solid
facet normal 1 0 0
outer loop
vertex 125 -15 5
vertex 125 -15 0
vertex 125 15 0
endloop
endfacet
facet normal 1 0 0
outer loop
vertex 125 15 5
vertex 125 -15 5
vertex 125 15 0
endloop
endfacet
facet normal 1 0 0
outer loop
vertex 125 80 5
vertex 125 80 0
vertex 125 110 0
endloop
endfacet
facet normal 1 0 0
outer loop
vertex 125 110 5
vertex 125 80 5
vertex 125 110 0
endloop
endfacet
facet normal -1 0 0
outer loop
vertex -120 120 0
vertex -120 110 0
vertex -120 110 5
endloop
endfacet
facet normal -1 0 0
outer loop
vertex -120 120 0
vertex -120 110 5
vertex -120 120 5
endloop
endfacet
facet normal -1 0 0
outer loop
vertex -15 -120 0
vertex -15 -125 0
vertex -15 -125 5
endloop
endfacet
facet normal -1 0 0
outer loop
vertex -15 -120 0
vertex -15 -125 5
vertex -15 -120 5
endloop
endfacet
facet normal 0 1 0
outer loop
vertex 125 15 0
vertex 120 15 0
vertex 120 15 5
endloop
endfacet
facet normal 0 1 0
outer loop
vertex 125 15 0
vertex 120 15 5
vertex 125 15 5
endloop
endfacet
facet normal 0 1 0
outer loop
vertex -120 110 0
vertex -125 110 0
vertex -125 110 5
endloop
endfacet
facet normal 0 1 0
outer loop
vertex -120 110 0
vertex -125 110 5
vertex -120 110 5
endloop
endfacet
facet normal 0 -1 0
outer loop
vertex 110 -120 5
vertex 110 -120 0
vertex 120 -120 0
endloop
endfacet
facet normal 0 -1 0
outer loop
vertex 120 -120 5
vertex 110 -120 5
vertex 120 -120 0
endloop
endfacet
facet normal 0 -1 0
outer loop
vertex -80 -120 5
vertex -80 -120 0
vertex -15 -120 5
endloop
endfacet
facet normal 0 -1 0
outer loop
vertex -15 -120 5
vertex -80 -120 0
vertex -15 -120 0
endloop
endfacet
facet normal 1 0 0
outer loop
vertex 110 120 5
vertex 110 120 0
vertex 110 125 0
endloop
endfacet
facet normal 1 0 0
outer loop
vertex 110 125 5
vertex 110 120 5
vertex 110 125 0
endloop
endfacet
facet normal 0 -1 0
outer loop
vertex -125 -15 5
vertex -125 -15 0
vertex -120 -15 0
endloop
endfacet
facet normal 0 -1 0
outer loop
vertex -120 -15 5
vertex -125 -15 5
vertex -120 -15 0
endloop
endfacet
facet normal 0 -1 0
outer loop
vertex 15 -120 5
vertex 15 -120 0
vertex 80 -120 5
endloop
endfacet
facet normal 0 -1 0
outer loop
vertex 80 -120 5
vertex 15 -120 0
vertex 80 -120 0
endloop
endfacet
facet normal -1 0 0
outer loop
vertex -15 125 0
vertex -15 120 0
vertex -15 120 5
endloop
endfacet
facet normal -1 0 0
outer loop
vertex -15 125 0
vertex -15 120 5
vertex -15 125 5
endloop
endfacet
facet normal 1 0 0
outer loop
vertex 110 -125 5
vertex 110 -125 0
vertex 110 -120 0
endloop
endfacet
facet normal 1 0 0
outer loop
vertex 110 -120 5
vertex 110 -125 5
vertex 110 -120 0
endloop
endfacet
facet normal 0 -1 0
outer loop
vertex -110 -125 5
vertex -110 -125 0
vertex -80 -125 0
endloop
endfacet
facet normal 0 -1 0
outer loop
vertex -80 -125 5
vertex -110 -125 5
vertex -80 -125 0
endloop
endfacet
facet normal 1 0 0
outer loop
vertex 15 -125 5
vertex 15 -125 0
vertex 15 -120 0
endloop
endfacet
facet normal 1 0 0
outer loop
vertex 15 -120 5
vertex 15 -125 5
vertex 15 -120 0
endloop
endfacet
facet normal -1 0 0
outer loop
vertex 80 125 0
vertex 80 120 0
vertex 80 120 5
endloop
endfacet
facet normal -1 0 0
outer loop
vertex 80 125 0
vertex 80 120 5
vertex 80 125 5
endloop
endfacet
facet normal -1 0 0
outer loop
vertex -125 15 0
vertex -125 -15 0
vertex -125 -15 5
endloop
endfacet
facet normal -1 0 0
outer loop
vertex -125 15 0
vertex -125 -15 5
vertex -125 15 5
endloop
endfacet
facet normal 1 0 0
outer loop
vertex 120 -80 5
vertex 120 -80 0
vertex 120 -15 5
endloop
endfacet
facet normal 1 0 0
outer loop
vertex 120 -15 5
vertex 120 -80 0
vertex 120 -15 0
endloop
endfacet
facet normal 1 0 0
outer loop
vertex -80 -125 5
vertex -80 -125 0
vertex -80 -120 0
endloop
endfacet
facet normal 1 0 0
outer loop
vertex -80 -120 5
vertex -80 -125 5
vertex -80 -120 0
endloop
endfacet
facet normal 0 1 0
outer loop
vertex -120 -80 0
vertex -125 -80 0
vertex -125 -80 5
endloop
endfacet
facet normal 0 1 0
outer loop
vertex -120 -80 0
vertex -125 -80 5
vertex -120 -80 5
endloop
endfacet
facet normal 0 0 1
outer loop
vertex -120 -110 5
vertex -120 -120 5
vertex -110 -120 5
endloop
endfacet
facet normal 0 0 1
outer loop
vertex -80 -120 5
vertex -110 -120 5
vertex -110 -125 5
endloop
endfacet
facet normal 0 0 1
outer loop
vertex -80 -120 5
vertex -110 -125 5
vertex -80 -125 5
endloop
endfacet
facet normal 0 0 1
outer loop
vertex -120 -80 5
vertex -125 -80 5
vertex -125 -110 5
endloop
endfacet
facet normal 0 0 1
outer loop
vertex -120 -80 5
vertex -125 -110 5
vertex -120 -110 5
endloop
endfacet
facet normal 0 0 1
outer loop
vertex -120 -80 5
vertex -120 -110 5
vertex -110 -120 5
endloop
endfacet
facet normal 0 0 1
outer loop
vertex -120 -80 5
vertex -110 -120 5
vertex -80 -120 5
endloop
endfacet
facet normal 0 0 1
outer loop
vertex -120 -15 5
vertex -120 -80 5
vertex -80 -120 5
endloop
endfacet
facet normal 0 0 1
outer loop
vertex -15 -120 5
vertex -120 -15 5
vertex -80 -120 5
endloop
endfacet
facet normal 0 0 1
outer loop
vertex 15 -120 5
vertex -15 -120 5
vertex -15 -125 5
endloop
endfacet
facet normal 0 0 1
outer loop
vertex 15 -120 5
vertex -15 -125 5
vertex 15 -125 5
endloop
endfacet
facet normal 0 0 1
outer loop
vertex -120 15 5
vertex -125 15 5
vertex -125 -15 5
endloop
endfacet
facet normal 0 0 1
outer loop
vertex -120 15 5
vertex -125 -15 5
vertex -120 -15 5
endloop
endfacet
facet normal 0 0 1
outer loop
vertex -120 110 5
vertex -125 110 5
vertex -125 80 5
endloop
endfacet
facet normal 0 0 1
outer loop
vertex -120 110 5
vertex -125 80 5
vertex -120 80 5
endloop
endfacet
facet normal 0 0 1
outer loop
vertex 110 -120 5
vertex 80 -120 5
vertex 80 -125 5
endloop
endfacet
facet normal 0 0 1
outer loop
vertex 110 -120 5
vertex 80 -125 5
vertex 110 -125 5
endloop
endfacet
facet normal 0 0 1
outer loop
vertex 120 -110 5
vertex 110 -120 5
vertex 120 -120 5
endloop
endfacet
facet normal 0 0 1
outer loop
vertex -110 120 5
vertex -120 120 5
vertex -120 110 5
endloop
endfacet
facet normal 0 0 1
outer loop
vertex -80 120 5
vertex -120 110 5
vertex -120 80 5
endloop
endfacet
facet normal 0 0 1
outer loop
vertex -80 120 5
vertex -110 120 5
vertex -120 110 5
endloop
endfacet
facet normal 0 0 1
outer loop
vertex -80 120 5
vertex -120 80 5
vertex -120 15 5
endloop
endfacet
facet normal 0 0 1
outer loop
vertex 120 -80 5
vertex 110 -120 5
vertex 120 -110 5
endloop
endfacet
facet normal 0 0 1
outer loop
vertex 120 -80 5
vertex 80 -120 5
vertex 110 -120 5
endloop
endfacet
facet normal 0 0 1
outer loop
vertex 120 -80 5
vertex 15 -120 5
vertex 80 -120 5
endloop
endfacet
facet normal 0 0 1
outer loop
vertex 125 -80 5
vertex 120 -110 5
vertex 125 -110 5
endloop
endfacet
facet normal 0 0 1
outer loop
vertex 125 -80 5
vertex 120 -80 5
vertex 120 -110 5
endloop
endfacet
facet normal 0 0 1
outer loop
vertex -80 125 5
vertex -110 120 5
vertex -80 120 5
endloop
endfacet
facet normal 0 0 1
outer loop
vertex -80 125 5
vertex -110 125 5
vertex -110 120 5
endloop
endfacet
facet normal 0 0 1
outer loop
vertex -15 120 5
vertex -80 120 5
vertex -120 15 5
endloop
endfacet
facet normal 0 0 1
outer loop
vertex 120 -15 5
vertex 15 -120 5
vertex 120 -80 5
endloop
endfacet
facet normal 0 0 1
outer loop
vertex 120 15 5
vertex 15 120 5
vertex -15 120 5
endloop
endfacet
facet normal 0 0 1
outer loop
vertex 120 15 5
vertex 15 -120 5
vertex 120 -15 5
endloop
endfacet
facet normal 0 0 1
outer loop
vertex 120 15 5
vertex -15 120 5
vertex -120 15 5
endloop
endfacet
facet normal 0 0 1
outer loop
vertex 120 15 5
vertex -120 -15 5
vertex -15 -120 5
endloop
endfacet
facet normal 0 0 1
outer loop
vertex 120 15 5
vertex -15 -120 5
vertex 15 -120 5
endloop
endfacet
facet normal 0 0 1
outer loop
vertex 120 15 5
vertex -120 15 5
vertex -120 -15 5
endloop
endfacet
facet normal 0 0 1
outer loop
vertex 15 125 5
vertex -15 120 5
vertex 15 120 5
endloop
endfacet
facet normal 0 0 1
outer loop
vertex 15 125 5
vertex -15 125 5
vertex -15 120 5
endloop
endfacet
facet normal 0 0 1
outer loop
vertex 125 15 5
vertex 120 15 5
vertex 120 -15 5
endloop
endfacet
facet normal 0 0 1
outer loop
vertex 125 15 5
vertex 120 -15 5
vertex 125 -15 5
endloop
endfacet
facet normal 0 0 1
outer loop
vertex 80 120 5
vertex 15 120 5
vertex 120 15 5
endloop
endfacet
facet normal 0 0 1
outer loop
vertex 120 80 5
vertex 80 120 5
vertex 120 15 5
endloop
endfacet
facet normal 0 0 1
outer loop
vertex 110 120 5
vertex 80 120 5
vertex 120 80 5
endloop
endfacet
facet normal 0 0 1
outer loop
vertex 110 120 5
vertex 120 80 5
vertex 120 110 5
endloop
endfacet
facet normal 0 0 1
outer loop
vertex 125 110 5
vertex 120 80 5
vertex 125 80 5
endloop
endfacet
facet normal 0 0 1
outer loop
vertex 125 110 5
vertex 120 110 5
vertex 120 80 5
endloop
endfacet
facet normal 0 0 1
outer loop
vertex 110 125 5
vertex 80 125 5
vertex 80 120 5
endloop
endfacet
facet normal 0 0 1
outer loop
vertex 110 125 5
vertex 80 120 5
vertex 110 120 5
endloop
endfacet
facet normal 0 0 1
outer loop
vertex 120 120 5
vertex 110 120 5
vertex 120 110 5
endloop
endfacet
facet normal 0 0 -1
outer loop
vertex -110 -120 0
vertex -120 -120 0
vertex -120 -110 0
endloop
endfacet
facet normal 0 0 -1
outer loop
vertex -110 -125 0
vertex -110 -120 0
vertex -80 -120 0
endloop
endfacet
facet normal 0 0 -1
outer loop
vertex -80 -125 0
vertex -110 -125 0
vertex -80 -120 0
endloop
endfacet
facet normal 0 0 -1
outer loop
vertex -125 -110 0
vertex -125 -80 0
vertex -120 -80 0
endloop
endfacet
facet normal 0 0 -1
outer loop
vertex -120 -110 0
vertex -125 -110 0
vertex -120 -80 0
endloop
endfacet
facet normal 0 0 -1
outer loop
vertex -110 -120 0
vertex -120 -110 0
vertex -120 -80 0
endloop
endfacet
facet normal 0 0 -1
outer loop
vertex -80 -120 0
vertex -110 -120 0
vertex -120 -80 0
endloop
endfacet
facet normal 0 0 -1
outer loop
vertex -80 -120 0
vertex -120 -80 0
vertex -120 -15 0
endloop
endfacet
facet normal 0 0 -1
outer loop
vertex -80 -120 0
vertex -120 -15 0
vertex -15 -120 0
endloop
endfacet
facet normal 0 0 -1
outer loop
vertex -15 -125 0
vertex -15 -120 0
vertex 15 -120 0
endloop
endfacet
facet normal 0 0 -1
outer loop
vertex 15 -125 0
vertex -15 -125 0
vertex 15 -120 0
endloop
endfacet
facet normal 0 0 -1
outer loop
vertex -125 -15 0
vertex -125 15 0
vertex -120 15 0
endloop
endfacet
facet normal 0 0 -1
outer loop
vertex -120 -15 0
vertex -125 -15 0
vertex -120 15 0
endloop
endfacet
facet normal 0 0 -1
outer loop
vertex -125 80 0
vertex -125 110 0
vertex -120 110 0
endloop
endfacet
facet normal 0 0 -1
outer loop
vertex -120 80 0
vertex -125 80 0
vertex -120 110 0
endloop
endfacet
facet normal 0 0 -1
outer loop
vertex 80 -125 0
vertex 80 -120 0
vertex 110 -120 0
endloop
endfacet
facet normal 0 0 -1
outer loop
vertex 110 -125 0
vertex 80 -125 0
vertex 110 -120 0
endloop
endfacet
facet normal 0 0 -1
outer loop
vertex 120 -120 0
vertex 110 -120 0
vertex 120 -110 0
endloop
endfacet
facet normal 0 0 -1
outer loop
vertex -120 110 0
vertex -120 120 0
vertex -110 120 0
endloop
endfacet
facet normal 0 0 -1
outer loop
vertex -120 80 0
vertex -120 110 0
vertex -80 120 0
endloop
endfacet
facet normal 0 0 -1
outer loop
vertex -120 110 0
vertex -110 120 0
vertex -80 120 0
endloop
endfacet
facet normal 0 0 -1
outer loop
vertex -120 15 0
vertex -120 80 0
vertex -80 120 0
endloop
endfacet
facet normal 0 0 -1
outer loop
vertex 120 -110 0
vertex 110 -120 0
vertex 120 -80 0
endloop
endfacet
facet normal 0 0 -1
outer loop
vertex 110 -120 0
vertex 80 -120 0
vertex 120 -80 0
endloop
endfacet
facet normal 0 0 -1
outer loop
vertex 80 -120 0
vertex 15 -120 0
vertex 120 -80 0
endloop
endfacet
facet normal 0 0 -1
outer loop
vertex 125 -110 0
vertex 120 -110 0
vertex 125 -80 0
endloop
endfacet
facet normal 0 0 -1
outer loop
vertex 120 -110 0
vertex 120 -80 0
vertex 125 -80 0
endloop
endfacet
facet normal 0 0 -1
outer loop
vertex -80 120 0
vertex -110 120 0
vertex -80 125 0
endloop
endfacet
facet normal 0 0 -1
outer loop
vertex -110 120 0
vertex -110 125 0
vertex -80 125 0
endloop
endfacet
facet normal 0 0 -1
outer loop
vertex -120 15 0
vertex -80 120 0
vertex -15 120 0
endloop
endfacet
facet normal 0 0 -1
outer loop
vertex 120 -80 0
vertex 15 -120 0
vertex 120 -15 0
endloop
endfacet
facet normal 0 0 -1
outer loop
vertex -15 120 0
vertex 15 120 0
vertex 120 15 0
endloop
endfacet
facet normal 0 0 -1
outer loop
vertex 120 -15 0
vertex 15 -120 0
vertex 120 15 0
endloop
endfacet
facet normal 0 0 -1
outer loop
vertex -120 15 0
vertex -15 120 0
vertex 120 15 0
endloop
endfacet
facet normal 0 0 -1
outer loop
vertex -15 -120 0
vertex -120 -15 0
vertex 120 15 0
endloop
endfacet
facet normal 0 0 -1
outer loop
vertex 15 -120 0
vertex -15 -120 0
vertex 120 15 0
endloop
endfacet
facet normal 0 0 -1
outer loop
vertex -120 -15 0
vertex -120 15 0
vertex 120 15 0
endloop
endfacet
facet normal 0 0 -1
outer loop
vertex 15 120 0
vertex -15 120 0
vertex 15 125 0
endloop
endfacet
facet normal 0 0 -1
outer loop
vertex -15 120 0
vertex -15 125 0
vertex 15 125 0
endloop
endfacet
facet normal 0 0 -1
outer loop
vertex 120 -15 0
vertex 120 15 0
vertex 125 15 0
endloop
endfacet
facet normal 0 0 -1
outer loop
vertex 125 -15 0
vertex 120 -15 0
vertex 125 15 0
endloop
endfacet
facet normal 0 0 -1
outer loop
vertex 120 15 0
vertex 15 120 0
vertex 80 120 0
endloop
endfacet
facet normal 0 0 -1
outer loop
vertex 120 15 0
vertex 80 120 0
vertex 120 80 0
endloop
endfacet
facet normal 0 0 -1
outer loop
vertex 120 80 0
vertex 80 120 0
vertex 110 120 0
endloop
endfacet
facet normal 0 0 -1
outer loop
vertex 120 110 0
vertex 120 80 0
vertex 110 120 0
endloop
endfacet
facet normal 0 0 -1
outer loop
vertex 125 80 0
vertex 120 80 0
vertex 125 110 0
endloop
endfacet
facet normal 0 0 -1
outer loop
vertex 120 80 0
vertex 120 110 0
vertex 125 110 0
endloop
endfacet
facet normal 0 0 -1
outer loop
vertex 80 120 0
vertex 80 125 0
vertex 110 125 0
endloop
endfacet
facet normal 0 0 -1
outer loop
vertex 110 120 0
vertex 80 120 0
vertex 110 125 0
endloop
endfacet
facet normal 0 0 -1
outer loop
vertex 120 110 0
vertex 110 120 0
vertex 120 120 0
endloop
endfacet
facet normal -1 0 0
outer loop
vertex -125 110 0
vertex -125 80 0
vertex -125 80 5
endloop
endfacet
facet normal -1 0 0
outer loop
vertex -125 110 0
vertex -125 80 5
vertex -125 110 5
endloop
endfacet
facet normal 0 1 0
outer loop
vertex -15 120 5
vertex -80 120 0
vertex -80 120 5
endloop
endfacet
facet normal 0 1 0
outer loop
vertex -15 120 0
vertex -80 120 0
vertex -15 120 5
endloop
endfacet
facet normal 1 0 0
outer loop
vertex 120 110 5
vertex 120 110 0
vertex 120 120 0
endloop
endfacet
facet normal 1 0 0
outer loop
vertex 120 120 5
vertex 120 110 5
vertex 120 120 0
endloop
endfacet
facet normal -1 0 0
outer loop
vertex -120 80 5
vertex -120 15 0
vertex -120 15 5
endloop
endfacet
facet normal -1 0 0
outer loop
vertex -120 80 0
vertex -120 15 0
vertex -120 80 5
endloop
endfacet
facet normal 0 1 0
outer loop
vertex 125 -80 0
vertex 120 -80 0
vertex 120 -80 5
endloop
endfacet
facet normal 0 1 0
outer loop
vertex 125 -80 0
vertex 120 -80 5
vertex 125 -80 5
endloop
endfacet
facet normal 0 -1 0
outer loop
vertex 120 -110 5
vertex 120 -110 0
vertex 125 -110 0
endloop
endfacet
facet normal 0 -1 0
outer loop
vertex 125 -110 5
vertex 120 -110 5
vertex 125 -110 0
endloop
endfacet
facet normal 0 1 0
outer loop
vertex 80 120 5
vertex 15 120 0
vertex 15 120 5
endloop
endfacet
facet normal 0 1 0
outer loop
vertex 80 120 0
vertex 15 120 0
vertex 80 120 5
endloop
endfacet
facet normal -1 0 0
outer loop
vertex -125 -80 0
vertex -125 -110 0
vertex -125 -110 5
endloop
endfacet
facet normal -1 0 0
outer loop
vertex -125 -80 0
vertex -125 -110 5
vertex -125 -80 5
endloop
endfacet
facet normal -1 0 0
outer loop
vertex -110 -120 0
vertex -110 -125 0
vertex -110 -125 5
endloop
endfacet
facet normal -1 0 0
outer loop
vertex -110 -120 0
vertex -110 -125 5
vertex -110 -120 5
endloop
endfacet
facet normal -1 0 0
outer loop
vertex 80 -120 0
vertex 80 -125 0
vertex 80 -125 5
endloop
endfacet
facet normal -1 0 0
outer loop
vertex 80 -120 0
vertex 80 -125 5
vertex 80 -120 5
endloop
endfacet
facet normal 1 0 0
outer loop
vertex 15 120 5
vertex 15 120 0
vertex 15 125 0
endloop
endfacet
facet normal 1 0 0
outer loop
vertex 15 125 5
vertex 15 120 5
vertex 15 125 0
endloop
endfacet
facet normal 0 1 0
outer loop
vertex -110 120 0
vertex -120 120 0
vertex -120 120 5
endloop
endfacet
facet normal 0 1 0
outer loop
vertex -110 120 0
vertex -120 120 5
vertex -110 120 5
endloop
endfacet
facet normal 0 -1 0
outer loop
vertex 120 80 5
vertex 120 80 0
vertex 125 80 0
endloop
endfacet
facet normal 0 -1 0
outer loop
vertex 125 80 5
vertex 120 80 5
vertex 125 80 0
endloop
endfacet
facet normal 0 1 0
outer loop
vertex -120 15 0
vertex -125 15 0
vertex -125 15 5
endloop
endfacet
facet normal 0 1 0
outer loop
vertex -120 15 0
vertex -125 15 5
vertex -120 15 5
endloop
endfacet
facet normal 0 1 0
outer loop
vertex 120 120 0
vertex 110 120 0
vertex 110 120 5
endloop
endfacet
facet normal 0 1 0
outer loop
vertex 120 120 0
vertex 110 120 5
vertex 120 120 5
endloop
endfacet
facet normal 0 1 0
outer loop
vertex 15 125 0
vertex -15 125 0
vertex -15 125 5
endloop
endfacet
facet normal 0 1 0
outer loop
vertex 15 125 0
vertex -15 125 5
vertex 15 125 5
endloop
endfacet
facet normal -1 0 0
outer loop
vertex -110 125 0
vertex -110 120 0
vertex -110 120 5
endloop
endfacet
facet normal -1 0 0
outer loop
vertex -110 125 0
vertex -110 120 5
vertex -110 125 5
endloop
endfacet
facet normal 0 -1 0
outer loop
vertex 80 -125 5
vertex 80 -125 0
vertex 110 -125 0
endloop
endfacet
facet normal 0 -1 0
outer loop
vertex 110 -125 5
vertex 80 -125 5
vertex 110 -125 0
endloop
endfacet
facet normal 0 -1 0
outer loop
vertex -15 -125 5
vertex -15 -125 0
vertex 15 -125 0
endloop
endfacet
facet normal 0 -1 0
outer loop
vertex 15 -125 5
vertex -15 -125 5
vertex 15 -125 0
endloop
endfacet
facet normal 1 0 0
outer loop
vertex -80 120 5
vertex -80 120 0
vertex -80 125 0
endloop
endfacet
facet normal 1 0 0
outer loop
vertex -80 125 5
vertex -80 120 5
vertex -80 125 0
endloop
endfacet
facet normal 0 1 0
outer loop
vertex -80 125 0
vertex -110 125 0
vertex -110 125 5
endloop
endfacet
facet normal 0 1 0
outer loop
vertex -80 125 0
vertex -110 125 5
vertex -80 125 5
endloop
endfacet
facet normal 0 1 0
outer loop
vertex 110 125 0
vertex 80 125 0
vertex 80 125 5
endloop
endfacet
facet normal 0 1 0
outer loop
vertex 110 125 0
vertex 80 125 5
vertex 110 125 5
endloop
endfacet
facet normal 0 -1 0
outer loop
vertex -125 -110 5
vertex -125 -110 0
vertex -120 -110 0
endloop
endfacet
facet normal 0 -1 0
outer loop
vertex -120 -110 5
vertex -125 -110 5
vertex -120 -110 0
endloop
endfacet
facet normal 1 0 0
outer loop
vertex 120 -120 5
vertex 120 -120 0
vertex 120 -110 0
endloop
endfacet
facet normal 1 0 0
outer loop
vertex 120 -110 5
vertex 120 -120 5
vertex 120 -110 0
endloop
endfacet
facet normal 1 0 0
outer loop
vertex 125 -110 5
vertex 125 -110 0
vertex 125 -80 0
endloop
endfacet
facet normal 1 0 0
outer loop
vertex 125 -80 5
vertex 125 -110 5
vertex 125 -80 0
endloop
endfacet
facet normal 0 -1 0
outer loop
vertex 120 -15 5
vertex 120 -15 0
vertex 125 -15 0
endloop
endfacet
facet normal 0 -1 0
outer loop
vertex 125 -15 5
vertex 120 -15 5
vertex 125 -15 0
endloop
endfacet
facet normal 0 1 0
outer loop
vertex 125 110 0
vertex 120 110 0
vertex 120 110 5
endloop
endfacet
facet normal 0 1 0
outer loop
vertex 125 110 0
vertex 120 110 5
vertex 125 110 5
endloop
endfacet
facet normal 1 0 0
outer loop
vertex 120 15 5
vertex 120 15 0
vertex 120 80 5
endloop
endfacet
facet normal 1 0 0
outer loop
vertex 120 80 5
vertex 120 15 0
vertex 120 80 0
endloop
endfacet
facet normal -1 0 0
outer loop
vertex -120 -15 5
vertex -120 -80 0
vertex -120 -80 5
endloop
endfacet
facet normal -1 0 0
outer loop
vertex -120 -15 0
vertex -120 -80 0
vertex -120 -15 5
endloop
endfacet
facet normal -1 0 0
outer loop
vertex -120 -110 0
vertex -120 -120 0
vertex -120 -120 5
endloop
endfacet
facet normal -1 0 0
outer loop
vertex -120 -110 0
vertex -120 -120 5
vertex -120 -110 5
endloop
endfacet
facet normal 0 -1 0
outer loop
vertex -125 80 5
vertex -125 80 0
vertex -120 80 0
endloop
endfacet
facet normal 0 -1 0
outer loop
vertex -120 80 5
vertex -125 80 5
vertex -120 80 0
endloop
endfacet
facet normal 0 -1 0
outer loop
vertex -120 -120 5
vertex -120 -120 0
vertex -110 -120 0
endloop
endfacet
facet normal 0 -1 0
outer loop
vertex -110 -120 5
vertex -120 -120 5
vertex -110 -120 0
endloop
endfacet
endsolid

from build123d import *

# Parameters (mm, degrees)
SKETCH1_W           = 240
SKETCH1_H           = 240
SKETCH1_W_2         = 30
SKETCH1_H_2         = 5
SKETCH1_W_3         = 5
SKETCH1_H_3         = 30
BOSS_EXTRUDE1_DEPTH = 5


with BuildPart() as part:
    # Sketch1 → Boss-Extrude1 (new body)
    with BuildSketch(Plane.XY):
        Rectangle(SKETCH1_W, SKETCH1_H)
        with Locations((0, 122.5)):
            Rectangle(SKETCH1_W_2, SKETCH1_H_2)
        with Locations((95, 122.5)):
            Rectangle(SKETCH1_W_2, SKETCH1_H_2)
        with Locations((-122.5, 95)):
            Rectangle(SKETCH1_W_3, SKETCH1_H_3)
        with Locations((-122.5, 0)):
            Rectangle(SKETCH1_W_3, SKETCH1_H_3)
        with Locations((-122.5, -95)):
            Rectangle(SKETCH1_W_3, SKETCH1_H_3)
        with Locations((-95, -122.5)):
            Rectangle(SKETCH1_W_2, SKETCH1_H_2)
        with Locations((0, -122.5)):
            Rectangle(SKETCH1_W_2, SKETCH1_H_2)
        with Locations((95, -122.5)):
            Rectangle(SKETCH1_W_2, SKETCH1_H_2)
        with Locations((122.5, -95)):
            Rectangle(SKETCH1_W_3, SKETCH1_H_3)
        with Locations((122.5, 0)):
            Rectangle(SKETCH1_W_3, SKETCH1_H_3)
        with Locations((122.5, 95)):
            Rectangle(SKETCH1_W_3, SKETCH1_H_3)
        with Locations((-95, 122.5)):
            Rectangle(SKETCH1_W_2, SKETCH1_H_2)
    extrude(amount=BOSS_EXTRUDE1_DEPTH)


solid = part.part
